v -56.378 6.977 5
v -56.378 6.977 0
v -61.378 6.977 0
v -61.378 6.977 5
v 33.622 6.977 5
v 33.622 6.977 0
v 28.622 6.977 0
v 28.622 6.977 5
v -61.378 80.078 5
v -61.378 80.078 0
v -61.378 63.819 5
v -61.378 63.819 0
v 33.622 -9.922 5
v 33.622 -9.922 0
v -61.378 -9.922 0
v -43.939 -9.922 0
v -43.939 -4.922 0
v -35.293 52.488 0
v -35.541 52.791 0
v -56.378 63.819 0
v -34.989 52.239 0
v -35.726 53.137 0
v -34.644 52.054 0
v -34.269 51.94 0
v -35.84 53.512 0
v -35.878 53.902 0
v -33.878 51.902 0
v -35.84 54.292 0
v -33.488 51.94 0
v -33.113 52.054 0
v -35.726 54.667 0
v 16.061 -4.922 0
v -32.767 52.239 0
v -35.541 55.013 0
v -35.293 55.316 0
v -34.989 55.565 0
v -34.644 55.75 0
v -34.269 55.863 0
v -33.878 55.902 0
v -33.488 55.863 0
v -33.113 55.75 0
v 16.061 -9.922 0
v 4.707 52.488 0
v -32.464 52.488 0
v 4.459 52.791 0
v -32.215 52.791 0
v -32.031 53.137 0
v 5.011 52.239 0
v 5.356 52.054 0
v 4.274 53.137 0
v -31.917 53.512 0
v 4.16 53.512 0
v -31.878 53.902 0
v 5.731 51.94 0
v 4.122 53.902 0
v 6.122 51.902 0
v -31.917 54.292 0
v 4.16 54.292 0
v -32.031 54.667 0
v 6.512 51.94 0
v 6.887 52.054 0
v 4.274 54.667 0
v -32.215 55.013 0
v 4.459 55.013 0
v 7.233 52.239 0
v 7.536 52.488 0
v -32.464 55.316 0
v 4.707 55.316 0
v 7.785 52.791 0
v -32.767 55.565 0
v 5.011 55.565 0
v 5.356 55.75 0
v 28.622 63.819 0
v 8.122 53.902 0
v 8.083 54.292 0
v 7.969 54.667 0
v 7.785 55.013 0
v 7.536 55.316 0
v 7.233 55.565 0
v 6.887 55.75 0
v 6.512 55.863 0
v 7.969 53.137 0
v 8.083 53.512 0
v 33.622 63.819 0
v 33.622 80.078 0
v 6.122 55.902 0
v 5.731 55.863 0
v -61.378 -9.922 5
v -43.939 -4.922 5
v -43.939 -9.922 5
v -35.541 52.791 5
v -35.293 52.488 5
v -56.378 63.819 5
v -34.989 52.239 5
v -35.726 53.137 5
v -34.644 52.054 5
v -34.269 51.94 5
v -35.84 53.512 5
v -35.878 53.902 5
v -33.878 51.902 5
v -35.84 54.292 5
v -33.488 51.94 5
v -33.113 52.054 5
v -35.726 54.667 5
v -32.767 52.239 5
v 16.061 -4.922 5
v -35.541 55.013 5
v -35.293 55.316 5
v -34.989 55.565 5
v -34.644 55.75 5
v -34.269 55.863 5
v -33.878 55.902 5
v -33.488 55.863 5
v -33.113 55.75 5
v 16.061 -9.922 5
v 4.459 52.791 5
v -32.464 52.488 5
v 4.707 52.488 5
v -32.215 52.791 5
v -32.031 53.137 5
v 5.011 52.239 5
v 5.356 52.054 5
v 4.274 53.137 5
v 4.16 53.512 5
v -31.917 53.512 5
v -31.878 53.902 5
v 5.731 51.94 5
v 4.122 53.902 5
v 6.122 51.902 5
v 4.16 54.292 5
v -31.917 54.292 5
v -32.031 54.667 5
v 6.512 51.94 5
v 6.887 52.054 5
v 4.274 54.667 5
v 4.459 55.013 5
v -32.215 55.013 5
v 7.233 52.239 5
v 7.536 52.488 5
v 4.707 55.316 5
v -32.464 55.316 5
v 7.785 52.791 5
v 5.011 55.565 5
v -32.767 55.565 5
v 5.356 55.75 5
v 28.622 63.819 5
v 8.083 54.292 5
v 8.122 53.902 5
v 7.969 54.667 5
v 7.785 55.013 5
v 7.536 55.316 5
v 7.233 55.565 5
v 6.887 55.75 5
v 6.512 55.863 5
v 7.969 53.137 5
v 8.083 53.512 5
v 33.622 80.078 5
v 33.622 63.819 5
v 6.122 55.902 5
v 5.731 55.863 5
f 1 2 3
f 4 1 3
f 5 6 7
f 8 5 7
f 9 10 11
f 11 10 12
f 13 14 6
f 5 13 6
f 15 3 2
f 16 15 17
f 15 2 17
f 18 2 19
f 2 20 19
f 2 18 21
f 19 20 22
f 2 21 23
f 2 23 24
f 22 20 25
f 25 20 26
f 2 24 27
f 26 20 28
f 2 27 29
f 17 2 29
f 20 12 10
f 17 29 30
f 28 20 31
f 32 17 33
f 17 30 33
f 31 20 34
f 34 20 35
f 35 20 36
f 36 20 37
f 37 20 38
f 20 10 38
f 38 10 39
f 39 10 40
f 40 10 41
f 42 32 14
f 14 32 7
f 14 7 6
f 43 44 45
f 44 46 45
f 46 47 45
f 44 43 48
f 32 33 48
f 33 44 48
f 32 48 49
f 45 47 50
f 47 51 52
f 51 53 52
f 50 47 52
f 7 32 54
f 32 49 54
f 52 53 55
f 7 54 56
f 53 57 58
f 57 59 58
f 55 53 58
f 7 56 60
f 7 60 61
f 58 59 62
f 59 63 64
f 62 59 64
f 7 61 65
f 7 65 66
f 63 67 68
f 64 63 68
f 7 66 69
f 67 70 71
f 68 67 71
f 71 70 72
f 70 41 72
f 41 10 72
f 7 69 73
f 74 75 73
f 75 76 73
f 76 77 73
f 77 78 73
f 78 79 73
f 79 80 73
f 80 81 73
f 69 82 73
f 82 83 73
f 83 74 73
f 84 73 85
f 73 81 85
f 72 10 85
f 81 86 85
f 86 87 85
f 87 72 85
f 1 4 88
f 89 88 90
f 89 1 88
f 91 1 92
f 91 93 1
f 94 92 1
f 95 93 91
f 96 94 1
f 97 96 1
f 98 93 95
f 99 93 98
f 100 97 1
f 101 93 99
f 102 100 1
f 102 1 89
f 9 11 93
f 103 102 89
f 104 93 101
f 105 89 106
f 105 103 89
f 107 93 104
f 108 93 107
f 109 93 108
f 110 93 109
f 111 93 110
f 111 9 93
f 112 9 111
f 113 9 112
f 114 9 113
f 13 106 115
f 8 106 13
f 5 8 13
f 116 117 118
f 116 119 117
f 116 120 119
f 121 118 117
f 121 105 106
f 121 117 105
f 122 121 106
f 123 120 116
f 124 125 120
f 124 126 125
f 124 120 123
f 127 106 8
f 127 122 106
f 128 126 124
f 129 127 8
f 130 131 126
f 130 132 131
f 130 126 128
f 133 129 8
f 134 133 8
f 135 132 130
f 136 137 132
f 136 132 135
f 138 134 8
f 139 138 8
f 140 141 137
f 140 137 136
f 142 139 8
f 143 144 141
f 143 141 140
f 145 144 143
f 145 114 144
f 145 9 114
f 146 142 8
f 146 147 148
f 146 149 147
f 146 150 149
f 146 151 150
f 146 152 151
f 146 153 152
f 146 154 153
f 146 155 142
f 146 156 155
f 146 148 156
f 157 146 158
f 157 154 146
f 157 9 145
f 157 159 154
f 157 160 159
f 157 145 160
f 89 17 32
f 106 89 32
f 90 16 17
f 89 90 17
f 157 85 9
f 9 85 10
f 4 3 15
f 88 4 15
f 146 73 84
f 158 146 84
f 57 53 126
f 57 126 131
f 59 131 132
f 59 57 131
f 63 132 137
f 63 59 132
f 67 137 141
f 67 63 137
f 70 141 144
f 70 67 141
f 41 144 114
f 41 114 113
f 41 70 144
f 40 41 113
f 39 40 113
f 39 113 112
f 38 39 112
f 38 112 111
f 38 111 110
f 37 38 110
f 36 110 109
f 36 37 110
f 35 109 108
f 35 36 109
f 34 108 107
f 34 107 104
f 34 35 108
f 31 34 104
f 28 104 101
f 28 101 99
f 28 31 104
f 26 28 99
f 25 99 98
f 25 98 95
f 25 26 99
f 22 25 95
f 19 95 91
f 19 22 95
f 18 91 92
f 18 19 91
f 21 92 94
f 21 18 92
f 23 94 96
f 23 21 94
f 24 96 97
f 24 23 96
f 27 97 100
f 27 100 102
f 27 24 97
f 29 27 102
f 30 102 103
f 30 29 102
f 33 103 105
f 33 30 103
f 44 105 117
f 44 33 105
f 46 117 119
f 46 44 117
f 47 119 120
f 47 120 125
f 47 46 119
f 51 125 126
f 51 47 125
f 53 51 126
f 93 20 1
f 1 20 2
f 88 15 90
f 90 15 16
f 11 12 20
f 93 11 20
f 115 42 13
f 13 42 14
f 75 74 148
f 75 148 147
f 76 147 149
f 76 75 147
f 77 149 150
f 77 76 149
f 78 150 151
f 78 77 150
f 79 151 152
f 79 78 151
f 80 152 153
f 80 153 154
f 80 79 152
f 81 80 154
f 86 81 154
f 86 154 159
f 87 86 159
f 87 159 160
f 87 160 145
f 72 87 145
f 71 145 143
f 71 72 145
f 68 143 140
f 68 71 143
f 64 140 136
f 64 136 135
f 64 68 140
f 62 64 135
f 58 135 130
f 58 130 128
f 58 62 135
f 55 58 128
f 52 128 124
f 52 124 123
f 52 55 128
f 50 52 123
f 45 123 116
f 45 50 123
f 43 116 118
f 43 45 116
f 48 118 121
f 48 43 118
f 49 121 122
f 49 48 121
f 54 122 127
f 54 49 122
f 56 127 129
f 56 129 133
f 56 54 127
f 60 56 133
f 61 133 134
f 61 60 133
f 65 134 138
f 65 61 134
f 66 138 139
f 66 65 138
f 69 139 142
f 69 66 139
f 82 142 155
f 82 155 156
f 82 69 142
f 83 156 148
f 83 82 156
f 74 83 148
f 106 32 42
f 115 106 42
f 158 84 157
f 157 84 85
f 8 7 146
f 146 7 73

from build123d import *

# Parameters (mm, degrees)
SKIZZE1_R                       = 2
AUFSATZ_LINEAR_AUSTRAGEN1_DEPTH = 5


with BuildPart() as part:
    # Skizze1 → Aufsatz-Linear austragen1 (new body)
    # profile 1 of 4: a face of its own
    with BuildSketch(Plane.XY):
        Polygon((-56.378328771, 75.078341375), (-56.378328771, 63.819239112), (-56.378328771, 6.977133849), (-56.378328771, -4.921658625), (-43.939454059, -4.921658625), (16.060545941, -4.921658625), (28.621671229, -4.921658625), (28.621671229, 6.977133849), (28.621671229, 63.819239112), (28.621671229, 75.078341375), align=None)
        with Locations((-33.878328771, 53.901870786)):
            Circle(SKIZZE1_R, mode=Mode.SUBTRACT)
        with Locations((6.121671229, 53.901870786)):
            Circle(SKIZZE1_R, mode=Mode.SUBTRACT)
    # profile 2 of 4: a face of its own
    with BuildSketch(Plane.XY):
        Polygon((-61.378328771, 80.078341375), (-61.378328771, 63.819239112), (-56.378328771, 63.819239112), (-56.378328771, 75.078341375), (28.621671229, 75.078341375), (28.621671229, 63.819239112), (33.621671229, 63.819239112), (33.621671229, 80.078341375), align=None)
    # profile 3 of 4: a face of its own
    with BuildSketch(Plane.XY):
        Polygon((-56.378328771, -4.921658625), (-56.378328771, 6.977133849), (-61.378328771, 6.977133849), (-61.378328771, -9.921658625), (-43.939454059, -9.921658625), (-43.939454059, -4.921658625), align=None)
    # profile 4 of 4: a face of its own
    with BuildSketch(Plane.XY):
        Polygon((33.621671229, 6.977133849), (28.621671229, 6.977133849), (28.621671229, -4.921658625), (16.060545941, -4.921658625), (16.060545941, -9.921658625), (33.621671229, -9.921658625), align=None)
    extrude(amount=AUFSATZ_LINEAR_AUSTRAGEN1_DEPTH)


solid = part.part
